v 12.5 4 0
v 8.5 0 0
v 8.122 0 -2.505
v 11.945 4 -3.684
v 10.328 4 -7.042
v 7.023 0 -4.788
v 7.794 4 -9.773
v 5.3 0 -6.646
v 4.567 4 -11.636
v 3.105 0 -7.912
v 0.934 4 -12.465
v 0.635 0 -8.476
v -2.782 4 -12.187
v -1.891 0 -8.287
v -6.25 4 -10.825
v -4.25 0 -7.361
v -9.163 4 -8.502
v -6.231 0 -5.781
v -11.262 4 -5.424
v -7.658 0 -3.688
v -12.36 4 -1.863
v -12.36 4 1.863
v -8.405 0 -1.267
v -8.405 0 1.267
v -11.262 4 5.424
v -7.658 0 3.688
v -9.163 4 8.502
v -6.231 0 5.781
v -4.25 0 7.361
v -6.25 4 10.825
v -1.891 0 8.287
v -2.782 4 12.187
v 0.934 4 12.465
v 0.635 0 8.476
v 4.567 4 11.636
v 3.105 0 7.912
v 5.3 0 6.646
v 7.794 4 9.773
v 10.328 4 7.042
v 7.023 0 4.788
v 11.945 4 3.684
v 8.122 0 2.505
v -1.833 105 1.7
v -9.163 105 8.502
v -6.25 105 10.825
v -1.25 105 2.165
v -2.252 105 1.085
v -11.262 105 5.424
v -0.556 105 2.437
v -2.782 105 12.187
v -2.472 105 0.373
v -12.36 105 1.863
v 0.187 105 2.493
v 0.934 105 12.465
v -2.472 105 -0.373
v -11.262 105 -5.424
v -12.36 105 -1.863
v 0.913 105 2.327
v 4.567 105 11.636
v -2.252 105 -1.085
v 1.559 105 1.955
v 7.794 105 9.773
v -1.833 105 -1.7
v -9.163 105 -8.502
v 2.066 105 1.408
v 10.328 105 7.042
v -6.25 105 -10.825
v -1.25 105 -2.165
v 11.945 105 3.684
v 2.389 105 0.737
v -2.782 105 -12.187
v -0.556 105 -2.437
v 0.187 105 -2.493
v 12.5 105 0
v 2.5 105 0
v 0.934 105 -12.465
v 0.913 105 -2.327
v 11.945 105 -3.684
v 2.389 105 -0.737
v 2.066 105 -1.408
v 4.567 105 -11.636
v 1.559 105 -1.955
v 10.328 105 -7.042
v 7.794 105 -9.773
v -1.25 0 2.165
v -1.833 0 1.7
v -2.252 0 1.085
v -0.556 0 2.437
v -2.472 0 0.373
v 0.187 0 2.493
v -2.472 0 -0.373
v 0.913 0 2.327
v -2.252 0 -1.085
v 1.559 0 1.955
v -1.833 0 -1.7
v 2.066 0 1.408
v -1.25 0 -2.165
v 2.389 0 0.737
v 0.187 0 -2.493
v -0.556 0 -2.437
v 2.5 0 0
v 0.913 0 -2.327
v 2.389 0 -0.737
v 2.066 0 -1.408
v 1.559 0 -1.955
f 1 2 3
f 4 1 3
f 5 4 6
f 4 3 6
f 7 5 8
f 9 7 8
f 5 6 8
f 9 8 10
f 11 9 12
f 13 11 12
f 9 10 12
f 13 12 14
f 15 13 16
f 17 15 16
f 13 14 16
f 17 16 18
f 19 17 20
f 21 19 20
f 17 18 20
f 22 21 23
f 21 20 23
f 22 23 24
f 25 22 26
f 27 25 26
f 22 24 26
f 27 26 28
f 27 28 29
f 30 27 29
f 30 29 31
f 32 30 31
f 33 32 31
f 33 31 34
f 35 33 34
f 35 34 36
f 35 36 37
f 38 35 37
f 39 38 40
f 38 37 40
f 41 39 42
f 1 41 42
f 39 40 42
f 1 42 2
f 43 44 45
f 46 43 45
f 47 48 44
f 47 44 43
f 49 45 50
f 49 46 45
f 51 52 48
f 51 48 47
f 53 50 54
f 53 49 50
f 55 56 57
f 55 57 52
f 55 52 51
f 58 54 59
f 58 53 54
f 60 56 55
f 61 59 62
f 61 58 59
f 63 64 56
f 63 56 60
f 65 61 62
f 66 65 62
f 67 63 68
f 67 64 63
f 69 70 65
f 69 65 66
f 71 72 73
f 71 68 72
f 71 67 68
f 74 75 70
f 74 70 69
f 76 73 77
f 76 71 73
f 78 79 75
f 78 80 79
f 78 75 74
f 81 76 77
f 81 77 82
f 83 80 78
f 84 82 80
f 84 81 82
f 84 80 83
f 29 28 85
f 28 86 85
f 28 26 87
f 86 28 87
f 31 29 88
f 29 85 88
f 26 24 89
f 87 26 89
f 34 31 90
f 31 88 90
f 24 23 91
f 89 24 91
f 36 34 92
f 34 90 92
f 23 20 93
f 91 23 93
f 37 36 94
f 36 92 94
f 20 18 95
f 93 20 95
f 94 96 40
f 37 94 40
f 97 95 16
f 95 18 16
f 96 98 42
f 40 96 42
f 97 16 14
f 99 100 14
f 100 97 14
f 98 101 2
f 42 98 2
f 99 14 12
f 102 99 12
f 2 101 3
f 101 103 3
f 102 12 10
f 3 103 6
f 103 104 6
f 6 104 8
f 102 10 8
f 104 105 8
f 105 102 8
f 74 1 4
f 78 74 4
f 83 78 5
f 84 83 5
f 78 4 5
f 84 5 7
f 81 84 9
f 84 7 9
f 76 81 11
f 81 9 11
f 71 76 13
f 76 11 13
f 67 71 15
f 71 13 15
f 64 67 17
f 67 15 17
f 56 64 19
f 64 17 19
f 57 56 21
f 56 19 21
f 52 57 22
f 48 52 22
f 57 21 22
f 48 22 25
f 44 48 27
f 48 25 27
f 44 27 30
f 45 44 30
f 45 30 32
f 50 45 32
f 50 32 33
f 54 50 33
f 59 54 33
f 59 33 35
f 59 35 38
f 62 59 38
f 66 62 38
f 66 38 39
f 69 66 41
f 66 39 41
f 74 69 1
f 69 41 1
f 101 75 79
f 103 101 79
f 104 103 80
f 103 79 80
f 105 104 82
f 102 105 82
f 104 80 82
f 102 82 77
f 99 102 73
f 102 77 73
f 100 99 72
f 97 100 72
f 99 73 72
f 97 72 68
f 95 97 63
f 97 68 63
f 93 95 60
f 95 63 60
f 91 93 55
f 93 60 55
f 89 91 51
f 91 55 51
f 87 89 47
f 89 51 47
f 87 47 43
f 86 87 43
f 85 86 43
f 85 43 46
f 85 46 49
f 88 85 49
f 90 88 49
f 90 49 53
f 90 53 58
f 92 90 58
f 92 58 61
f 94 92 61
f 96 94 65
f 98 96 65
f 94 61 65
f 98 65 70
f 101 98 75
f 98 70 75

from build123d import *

# Parameters (mm, degrees)
SKETCH1_R           = 12.5
BOSS_EXTRUDE1_DEPTH = 105
SKETCH2_R           = 2.5
CUT_EXTRUDE1_DEPTH  = 105
CHAMFER1_SIZE       = 4


with BuildPart() as part:
    # Sketch1 → Boss-Extrude1 (new body)
    with BuildSketch(Plane(origin=(0, 0, 0), x_dir=(1, 0, 0), z_dir=(0, 1, 0))):
        Circle(SKETCH1_R)
    extrude(amount=BOSS_EXTRUDE1_DEPTH)

    # Sketch2 → Cut-Extrude1 (cut)
    with BuildSketch(Plane(origin=(0, 105, 0), x_dir=(1, 0, 0), z_dir=(0, 1, 0))):
        Circle(SKETCH2_R)
    extrude(amount=-CUT_EXTRUDE1_DEPTH, mode=Mode.SUBTRACT)

    # Chamfer1
    chamfer1_edges = [part.edges().sort_by_distance(p)[0] for p in [
        (-12.5, 0, 0),
    ]]
    chamfer(chamfer1_edges, length=CHAMFER1_SIZE)


solid = part.part
